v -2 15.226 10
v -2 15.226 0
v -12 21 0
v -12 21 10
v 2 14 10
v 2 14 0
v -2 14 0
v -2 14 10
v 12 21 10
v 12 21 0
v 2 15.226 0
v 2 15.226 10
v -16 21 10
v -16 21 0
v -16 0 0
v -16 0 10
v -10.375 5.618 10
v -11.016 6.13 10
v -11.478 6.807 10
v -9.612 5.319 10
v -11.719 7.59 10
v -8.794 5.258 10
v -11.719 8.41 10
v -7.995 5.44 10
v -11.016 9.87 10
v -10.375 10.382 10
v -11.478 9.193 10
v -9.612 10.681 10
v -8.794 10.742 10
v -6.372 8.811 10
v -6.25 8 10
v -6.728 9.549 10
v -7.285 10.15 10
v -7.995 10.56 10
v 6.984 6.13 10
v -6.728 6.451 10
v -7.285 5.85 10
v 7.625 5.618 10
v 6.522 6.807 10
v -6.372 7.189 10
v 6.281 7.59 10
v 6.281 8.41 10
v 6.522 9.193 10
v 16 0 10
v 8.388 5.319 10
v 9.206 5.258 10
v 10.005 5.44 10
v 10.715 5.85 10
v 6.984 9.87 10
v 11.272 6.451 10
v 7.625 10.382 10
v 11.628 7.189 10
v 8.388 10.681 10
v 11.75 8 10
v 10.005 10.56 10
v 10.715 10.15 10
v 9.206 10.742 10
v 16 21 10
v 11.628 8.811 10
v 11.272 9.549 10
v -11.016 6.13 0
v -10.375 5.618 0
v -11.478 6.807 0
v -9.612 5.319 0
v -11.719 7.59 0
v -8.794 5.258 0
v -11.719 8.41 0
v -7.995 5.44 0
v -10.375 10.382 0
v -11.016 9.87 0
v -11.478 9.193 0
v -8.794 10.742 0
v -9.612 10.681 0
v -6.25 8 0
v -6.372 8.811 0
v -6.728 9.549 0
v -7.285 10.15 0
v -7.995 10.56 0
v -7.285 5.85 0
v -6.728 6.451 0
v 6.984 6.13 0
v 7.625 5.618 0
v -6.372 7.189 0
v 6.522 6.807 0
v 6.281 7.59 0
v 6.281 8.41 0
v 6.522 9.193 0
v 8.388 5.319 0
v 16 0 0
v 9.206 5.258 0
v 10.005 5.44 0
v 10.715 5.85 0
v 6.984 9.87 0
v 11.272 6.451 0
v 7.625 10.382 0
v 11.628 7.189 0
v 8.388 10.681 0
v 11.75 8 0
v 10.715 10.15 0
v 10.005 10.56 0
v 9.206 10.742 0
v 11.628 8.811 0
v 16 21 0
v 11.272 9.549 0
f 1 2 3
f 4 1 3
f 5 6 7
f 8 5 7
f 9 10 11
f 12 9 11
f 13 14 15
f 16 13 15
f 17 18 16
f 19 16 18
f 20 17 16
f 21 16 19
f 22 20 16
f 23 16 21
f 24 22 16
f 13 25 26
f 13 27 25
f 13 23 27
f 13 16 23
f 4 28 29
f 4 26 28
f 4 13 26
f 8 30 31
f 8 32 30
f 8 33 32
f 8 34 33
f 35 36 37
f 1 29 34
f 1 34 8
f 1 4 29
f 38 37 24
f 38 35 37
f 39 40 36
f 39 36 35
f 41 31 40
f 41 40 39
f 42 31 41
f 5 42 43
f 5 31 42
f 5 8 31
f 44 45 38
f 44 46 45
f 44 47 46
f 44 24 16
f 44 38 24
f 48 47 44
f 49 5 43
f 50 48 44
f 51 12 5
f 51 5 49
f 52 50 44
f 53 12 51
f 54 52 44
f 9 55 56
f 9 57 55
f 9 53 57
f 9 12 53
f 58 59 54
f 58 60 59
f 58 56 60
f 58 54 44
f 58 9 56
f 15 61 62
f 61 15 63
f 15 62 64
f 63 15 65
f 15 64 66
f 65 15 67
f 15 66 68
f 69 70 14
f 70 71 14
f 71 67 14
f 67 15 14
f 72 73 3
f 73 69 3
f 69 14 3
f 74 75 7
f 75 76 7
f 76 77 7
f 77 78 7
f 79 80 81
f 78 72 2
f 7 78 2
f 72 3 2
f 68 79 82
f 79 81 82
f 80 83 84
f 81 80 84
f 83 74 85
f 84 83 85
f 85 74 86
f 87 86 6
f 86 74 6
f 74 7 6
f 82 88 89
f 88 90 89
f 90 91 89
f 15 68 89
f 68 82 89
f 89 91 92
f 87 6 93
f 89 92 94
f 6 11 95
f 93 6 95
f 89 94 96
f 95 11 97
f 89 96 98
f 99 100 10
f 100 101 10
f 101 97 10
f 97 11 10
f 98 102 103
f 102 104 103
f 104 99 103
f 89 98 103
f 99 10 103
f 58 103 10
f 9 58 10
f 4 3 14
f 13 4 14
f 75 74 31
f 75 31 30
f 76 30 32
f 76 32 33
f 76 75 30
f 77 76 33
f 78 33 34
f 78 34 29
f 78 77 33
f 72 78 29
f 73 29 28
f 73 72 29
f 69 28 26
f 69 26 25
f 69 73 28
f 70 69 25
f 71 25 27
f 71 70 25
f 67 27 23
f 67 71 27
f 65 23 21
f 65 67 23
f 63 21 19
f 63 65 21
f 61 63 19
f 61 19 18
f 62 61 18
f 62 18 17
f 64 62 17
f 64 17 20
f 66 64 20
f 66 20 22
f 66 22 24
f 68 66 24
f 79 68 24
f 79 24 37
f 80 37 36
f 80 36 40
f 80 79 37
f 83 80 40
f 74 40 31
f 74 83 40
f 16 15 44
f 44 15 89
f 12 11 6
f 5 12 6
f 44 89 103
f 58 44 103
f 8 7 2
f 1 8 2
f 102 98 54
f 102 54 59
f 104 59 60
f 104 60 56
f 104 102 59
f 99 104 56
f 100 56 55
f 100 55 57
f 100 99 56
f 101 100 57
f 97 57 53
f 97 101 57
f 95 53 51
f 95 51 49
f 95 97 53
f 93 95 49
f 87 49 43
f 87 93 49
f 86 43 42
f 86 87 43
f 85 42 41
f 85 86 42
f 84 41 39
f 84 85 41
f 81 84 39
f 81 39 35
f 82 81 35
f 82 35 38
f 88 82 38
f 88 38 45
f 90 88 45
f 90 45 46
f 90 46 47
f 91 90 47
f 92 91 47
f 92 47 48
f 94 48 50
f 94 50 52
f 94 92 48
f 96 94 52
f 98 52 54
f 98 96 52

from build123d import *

# Parameters (mm, degrees)
SKETCH_1_R      = 2.75
EXTRUDE_1_DEPTH = 10


with BuildPart() as part:
    # Эскиз1 → Бобышка-Вытянуть1 (new body)
    # profile 1 of 2: a face of its own
    with BuildSketch(Plane.XY):
        Polygon((-16, 0), (0, 0), (0, 14), (-2, 14), (-2, 15.226497308), (-12, 21), (-16, 21), align=None)
        with Locations((-9, 8)):
            Circle(SKETCH_1_R, mode=Mode.SUBTRACT)
    # profile 2 of 2: a face of its own
    with BuildSketch(Plane.XY):
        Polygon((0, 14), (0, 0), (16, 0), (16, 21), (12, 21), (2, 15.226497308), (2, 14), align=None)
        with Locations((9, 8)):
            Circle(SKETCH_1_R, mode=Mode.SUBTRACT)
    extrude(amount=EXTRUDE_1_DEPTH)


solid = part.part
